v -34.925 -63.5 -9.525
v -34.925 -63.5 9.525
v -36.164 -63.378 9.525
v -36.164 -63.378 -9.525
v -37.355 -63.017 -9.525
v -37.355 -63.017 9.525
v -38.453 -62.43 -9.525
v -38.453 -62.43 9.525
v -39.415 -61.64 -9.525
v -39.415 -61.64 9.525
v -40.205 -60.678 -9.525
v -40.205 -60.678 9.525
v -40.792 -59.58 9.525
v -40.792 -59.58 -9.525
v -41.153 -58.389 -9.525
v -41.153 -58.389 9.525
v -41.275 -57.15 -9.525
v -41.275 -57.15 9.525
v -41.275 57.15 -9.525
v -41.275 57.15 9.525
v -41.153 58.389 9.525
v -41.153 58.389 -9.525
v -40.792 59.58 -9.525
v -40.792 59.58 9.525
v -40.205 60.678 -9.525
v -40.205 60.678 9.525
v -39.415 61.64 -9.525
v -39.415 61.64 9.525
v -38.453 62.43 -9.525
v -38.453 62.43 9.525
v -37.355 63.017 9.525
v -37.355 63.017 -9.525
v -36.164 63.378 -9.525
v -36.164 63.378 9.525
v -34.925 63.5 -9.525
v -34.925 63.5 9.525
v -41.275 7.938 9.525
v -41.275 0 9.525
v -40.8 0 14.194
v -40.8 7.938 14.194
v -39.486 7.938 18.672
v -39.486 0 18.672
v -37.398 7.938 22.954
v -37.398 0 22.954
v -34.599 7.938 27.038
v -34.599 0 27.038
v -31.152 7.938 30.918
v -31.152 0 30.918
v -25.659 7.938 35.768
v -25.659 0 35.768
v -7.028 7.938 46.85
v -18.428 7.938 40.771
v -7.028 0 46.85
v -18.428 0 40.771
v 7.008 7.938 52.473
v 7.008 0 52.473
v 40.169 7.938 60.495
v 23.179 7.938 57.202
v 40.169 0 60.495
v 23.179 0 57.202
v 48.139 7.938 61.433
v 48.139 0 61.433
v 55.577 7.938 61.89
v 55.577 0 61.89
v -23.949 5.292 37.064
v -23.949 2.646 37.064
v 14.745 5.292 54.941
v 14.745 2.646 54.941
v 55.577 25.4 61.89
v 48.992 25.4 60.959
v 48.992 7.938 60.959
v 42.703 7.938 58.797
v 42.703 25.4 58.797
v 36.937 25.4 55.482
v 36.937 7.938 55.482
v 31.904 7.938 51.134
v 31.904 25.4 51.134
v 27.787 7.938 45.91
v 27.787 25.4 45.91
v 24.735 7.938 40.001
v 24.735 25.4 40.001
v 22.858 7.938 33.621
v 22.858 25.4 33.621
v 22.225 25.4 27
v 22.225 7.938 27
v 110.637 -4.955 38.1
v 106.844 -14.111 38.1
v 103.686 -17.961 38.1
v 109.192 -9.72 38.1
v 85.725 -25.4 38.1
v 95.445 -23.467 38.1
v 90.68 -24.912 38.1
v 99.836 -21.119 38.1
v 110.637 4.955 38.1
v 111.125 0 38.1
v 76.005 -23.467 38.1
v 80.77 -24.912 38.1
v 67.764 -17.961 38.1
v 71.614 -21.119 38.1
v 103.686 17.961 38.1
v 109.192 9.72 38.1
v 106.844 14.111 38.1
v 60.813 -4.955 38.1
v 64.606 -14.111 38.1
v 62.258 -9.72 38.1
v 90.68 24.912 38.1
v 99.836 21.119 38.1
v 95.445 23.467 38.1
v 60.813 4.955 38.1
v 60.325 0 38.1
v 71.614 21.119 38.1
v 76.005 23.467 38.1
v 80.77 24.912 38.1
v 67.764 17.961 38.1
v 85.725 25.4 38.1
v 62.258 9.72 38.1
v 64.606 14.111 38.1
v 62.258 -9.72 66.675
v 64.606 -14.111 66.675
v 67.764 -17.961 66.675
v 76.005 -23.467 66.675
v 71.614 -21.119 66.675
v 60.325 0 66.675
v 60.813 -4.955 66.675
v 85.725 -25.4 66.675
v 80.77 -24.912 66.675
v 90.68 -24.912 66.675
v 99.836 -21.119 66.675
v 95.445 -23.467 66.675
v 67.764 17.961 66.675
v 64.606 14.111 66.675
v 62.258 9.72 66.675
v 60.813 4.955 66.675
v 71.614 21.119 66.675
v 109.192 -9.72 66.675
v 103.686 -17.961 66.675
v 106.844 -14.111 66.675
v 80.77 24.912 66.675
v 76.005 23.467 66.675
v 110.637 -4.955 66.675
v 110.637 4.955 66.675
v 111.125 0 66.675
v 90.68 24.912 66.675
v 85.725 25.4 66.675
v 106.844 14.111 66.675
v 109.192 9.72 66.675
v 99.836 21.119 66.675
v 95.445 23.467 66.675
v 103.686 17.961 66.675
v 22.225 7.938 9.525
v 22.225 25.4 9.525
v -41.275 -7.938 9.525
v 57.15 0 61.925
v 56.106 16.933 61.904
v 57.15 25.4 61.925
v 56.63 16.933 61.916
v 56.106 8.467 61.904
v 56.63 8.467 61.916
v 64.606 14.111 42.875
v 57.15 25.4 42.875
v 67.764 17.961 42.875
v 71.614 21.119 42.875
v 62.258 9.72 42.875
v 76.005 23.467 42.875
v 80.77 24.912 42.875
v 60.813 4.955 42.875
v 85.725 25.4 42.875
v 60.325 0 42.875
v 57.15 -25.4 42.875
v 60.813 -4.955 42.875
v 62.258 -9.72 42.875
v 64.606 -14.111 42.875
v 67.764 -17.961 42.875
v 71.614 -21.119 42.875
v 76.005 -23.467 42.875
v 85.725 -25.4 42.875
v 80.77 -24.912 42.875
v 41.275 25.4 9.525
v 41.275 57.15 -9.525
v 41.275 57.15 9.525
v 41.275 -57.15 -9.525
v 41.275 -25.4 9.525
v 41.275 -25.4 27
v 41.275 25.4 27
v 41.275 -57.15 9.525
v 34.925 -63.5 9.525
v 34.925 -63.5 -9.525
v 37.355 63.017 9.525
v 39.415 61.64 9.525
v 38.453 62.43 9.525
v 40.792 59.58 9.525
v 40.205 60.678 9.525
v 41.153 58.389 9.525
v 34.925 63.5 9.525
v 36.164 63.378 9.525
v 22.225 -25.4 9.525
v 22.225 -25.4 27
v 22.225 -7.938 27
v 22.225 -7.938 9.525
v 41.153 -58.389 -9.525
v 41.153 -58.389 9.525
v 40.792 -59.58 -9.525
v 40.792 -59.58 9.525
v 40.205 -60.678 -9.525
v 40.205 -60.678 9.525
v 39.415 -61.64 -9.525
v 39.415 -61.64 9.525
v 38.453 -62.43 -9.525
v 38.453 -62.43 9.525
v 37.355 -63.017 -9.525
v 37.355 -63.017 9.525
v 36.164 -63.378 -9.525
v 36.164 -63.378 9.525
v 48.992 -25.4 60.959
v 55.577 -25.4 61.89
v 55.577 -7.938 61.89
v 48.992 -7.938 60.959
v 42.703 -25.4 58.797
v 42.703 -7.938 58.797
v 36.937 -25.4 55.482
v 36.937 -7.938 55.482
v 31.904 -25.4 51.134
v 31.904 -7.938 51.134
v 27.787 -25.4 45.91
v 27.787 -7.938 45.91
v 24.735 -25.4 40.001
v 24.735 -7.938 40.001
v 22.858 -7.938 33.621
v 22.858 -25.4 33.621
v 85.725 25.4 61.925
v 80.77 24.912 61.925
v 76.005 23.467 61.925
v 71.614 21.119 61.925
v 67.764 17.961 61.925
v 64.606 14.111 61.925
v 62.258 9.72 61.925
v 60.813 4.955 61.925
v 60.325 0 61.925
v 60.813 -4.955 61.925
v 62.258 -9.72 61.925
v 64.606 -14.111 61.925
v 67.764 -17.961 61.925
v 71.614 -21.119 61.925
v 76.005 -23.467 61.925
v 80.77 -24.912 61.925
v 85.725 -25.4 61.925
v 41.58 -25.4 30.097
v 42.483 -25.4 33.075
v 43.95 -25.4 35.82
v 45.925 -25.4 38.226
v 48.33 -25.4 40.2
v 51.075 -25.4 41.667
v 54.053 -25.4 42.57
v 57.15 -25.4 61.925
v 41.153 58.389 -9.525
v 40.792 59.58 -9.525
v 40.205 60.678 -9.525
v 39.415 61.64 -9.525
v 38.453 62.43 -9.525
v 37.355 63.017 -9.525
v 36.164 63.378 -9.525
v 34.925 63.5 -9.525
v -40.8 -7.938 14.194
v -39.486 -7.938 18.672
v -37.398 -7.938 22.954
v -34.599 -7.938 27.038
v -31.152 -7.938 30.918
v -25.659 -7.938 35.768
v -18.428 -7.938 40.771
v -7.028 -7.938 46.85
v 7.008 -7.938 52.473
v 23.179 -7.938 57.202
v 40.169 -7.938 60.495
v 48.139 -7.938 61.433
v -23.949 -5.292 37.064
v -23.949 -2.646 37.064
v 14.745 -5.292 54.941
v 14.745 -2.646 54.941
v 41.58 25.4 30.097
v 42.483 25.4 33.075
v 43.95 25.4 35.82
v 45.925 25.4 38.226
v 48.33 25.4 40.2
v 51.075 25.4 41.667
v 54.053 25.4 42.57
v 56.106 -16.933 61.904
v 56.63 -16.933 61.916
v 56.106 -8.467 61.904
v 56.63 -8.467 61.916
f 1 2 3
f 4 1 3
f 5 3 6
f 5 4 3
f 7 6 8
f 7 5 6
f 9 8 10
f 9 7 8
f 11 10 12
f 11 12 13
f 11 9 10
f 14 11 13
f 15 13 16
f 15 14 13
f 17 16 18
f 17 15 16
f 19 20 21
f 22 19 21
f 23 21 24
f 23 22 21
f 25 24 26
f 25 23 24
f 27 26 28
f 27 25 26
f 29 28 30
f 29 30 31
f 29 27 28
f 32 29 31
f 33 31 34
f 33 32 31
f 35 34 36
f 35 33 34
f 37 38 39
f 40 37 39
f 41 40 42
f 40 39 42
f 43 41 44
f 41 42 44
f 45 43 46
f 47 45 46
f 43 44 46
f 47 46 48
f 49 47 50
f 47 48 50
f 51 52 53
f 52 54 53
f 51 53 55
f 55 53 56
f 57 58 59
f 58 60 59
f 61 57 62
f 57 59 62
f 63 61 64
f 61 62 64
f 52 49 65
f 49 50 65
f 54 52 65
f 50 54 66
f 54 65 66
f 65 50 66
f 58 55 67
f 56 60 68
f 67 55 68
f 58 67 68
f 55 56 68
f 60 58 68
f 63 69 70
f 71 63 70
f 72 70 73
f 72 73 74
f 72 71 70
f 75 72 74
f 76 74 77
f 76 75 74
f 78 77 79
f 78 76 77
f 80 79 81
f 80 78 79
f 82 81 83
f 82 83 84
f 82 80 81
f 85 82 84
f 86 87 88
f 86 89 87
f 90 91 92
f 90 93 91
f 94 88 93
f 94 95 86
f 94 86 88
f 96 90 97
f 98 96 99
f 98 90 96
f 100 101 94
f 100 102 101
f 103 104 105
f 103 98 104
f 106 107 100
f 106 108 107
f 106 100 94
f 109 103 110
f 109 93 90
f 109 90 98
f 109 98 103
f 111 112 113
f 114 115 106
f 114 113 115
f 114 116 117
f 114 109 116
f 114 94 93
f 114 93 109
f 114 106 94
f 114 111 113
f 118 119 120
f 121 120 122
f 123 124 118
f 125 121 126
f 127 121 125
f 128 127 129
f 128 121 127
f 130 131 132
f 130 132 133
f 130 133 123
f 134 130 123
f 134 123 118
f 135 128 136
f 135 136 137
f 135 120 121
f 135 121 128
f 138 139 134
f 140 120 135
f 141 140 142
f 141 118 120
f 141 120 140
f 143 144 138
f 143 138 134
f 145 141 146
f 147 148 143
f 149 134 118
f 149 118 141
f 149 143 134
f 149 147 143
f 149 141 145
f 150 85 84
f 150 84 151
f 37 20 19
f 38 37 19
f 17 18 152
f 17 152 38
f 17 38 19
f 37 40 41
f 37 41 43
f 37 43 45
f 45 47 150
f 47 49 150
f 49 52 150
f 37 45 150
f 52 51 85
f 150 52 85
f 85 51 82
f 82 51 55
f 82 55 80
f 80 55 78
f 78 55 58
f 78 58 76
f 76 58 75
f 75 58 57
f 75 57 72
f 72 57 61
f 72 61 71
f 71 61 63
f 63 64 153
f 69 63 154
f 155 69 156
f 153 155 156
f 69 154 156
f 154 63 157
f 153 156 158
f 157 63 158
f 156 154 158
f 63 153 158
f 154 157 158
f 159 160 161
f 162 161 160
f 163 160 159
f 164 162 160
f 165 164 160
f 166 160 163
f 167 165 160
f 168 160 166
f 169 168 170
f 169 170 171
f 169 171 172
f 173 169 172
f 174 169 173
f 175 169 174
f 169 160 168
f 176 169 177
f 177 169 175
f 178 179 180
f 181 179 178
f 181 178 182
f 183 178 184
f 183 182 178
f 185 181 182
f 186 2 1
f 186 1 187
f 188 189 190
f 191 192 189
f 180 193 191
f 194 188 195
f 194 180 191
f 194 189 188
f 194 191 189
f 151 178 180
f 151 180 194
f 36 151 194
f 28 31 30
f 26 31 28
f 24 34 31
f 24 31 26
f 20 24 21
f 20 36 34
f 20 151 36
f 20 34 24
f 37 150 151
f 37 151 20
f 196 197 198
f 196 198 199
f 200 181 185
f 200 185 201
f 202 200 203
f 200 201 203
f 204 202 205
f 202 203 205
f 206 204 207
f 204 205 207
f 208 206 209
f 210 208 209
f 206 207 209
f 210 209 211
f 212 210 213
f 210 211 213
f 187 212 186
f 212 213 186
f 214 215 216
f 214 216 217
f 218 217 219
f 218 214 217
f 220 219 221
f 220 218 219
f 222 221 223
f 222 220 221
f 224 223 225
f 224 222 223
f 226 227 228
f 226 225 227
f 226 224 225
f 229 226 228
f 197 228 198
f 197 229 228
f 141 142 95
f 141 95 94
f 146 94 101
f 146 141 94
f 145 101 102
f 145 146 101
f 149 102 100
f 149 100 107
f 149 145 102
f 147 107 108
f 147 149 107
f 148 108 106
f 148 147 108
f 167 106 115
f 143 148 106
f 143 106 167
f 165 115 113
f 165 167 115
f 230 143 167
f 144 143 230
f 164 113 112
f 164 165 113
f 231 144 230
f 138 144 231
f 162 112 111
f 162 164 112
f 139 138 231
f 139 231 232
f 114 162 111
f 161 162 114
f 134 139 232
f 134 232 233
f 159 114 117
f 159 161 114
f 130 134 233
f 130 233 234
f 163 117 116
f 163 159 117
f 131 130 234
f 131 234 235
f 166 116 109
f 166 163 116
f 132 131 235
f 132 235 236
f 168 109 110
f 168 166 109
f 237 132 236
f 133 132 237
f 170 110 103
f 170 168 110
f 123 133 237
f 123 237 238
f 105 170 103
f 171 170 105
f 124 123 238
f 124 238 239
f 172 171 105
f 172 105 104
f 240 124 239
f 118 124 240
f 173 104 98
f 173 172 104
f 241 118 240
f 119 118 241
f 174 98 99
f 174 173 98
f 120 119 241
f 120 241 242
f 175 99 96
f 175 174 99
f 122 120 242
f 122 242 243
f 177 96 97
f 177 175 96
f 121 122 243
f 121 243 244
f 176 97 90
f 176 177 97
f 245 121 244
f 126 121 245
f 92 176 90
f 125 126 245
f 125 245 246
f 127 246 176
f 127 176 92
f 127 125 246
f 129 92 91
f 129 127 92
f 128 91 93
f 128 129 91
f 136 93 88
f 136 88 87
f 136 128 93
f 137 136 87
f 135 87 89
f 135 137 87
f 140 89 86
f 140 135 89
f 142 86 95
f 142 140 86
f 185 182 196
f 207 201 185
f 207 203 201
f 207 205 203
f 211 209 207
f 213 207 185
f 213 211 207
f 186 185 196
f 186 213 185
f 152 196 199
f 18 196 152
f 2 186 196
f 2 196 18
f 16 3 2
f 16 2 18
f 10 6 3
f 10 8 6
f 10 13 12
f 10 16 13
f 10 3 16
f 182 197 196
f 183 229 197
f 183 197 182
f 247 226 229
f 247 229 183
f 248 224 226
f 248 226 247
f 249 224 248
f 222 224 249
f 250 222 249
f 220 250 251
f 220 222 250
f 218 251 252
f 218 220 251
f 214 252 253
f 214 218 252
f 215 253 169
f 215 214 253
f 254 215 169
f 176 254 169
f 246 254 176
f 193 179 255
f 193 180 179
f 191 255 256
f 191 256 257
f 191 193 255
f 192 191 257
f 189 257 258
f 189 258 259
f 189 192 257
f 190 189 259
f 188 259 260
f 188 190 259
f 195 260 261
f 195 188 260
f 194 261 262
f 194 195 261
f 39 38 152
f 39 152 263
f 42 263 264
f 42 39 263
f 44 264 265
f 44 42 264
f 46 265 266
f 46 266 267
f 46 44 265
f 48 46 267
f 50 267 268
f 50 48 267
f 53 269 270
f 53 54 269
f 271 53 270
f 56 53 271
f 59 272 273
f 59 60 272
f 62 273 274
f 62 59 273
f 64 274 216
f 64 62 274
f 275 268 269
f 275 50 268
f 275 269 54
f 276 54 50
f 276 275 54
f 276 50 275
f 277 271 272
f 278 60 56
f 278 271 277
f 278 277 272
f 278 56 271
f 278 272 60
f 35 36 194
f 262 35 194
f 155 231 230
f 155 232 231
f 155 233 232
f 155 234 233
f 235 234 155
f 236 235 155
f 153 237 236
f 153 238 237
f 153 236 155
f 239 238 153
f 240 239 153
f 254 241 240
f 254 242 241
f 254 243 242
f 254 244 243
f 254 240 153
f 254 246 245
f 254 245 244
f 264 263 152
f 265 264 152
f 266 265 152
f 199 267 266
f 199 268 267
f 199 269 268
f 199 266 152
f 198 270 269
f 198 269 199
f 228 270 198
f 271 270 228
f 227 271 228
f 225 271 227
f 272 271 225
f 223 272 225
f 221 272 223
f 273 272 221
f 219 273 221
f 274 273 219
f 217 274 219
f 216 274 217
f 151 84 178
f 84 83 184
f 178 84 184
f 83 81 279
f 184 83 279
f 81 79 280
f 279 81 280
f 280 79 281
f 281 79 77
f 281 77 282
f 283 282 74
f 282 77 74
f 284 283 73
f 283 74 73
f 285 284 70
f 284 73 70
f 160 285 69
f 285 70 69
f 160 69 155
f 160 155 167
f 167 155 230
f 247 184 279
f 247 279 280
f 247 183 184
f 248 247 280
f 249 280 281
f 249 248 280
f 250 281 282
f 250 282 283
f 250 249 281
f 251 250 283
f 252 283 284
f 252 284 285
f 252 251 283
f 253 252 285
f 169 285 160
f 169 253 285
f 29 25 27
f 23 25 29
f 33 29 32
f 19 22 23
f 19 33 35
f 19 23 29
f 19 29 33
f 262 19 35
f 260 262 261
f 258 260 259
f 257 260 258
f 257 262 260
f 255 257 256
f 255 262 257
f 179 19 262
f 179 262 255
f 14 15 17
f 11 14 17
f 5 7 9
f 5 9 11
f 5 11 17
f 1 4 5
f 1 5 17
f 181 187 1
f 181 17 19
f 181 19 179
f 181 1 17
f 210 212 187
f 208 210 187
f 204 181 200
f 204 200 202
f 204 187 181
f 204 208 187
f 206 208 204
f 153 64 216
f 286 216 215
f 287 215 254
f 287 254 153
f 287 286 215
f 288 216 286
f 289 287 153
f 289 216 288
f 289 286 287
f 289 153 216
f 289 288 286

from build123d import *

# Parameters (mm, degrees)
F1_DEPTH = 63.5
F0_W     = 25.4
F0_H     = 19.0499988828
F2_DEPTH = 25.4
F3_DEPTH = 7.9375
F5_R     = 6.35


# Not quite as in the source:
# - ends of sketch curves that miss each other by under 0.0002 mm in the source are joined


with BuildPart() as f1:
    # F0 (on Front) → F1 (new body, symmetric)
    with BuildSketch(Plane.XZ):
        Polygon((41.275, -9.525), (41.275, 9.525), (22.2249999642, 9.525), (-41.275, 9.525), (-41.275, -9.525), align=None)
    extrude(amount=F1_DEPTH, both=True)

    # F0 (on Front) → F2 (join, symmetric)
    with BuildSketch(Plane.XZ):
        with Locations((73.025, 52.4001994414)):
            Rectangle(F0_W, F0_H)
        with BuildLine():
            Line((22.2249999642, 9.525), (41.275, 9.525))
            Line((41.275, 9.525), (41.275, 27.0002))
            ThreePointArc((41.275, 27.0002), (45.9246798487, 38.2255201513), (57.15, 42.8752))
            Line((57.15, 42.8752), (60.325, 42.8752))
            Line((60.325, 42.8752), (60.325, 61.9251988828))
            Line((60.325, 61.9251988828), (57.15, 61.9251988828))
            add(Edge.make_bspline(
                [(55.577466475, 61.8897796164), (56.107456948, 61.9056705872), (56.6317308349, 61.9174837091), (57.15, 61.9251988828)],
                knots=[109.8639655387, 109.8639655387, 109.8639655387, 109.8639655387, 111.5045361803, 111.5045361803, 111.5045361803, 111.5045361803], degree=3))
            ThreePointArc((55.577466475, 61.8897796164), (31.9044423619, 51.133526481), (22.2249999642, 27.0002))
            Line((22.2249999642, 27.0002), (22.2249999642, 9.525))
        make_face()
    extrude(amount=F2_DEPTH, both=True)

    # F0 (on Front) → F3 (join, symmetric)
    with BuildSketch(Plane.XZ):
        with BuildLine():
            Line((-41.275, 9.525), (22.2249999642, 9.525))
            Line((22.2249999642, 9.525), (22.2249999642, 27.0002))
            ThreePointArc((22.2249999642, 27.0002), (31.9044423619, 51.133526481), (55.577466475, 61.8897796164))
            add(Edge.make_bspline(
                [(-41.275, 9.525), (-41.042616605, 41.4740477998), (20.0856360221, 60.8256102231), (55.577466475, 61.8897796164)],
                knots=[0, 0, 0, 0, 109.8639655387, 109.8639655387, 109.8639655387, 109.8639655387], degree=3))
        make_face()
    extrude(amount=F3_DEPTH, both=True)

    # F0 (on Front) → F4 (revolve)
    with BuildSketch(Plane.XZ):
        Polygon((85.725, 61.9251988828), (85.725, 42.8752), (85.725, 38.1), (111.125, 38.1), (111.125, 66.675), (85.725, 66.675), align=None)
    revolve(axis=Axis((85.725, 0, 52.3875), (0, 0, 1)))

    # F5
    f5_edges = [f1.edges().sort_by_distance(p)[0] for p in [
        (41.275, -63.5, 0),
        (41.275, 63.5, 0),
        (-41.275, -63.5, 0),
        (-41.275, 63.5, 0),
    ]]
    fillet(f5_edges, radius=F5_R)


solid = f1.part
